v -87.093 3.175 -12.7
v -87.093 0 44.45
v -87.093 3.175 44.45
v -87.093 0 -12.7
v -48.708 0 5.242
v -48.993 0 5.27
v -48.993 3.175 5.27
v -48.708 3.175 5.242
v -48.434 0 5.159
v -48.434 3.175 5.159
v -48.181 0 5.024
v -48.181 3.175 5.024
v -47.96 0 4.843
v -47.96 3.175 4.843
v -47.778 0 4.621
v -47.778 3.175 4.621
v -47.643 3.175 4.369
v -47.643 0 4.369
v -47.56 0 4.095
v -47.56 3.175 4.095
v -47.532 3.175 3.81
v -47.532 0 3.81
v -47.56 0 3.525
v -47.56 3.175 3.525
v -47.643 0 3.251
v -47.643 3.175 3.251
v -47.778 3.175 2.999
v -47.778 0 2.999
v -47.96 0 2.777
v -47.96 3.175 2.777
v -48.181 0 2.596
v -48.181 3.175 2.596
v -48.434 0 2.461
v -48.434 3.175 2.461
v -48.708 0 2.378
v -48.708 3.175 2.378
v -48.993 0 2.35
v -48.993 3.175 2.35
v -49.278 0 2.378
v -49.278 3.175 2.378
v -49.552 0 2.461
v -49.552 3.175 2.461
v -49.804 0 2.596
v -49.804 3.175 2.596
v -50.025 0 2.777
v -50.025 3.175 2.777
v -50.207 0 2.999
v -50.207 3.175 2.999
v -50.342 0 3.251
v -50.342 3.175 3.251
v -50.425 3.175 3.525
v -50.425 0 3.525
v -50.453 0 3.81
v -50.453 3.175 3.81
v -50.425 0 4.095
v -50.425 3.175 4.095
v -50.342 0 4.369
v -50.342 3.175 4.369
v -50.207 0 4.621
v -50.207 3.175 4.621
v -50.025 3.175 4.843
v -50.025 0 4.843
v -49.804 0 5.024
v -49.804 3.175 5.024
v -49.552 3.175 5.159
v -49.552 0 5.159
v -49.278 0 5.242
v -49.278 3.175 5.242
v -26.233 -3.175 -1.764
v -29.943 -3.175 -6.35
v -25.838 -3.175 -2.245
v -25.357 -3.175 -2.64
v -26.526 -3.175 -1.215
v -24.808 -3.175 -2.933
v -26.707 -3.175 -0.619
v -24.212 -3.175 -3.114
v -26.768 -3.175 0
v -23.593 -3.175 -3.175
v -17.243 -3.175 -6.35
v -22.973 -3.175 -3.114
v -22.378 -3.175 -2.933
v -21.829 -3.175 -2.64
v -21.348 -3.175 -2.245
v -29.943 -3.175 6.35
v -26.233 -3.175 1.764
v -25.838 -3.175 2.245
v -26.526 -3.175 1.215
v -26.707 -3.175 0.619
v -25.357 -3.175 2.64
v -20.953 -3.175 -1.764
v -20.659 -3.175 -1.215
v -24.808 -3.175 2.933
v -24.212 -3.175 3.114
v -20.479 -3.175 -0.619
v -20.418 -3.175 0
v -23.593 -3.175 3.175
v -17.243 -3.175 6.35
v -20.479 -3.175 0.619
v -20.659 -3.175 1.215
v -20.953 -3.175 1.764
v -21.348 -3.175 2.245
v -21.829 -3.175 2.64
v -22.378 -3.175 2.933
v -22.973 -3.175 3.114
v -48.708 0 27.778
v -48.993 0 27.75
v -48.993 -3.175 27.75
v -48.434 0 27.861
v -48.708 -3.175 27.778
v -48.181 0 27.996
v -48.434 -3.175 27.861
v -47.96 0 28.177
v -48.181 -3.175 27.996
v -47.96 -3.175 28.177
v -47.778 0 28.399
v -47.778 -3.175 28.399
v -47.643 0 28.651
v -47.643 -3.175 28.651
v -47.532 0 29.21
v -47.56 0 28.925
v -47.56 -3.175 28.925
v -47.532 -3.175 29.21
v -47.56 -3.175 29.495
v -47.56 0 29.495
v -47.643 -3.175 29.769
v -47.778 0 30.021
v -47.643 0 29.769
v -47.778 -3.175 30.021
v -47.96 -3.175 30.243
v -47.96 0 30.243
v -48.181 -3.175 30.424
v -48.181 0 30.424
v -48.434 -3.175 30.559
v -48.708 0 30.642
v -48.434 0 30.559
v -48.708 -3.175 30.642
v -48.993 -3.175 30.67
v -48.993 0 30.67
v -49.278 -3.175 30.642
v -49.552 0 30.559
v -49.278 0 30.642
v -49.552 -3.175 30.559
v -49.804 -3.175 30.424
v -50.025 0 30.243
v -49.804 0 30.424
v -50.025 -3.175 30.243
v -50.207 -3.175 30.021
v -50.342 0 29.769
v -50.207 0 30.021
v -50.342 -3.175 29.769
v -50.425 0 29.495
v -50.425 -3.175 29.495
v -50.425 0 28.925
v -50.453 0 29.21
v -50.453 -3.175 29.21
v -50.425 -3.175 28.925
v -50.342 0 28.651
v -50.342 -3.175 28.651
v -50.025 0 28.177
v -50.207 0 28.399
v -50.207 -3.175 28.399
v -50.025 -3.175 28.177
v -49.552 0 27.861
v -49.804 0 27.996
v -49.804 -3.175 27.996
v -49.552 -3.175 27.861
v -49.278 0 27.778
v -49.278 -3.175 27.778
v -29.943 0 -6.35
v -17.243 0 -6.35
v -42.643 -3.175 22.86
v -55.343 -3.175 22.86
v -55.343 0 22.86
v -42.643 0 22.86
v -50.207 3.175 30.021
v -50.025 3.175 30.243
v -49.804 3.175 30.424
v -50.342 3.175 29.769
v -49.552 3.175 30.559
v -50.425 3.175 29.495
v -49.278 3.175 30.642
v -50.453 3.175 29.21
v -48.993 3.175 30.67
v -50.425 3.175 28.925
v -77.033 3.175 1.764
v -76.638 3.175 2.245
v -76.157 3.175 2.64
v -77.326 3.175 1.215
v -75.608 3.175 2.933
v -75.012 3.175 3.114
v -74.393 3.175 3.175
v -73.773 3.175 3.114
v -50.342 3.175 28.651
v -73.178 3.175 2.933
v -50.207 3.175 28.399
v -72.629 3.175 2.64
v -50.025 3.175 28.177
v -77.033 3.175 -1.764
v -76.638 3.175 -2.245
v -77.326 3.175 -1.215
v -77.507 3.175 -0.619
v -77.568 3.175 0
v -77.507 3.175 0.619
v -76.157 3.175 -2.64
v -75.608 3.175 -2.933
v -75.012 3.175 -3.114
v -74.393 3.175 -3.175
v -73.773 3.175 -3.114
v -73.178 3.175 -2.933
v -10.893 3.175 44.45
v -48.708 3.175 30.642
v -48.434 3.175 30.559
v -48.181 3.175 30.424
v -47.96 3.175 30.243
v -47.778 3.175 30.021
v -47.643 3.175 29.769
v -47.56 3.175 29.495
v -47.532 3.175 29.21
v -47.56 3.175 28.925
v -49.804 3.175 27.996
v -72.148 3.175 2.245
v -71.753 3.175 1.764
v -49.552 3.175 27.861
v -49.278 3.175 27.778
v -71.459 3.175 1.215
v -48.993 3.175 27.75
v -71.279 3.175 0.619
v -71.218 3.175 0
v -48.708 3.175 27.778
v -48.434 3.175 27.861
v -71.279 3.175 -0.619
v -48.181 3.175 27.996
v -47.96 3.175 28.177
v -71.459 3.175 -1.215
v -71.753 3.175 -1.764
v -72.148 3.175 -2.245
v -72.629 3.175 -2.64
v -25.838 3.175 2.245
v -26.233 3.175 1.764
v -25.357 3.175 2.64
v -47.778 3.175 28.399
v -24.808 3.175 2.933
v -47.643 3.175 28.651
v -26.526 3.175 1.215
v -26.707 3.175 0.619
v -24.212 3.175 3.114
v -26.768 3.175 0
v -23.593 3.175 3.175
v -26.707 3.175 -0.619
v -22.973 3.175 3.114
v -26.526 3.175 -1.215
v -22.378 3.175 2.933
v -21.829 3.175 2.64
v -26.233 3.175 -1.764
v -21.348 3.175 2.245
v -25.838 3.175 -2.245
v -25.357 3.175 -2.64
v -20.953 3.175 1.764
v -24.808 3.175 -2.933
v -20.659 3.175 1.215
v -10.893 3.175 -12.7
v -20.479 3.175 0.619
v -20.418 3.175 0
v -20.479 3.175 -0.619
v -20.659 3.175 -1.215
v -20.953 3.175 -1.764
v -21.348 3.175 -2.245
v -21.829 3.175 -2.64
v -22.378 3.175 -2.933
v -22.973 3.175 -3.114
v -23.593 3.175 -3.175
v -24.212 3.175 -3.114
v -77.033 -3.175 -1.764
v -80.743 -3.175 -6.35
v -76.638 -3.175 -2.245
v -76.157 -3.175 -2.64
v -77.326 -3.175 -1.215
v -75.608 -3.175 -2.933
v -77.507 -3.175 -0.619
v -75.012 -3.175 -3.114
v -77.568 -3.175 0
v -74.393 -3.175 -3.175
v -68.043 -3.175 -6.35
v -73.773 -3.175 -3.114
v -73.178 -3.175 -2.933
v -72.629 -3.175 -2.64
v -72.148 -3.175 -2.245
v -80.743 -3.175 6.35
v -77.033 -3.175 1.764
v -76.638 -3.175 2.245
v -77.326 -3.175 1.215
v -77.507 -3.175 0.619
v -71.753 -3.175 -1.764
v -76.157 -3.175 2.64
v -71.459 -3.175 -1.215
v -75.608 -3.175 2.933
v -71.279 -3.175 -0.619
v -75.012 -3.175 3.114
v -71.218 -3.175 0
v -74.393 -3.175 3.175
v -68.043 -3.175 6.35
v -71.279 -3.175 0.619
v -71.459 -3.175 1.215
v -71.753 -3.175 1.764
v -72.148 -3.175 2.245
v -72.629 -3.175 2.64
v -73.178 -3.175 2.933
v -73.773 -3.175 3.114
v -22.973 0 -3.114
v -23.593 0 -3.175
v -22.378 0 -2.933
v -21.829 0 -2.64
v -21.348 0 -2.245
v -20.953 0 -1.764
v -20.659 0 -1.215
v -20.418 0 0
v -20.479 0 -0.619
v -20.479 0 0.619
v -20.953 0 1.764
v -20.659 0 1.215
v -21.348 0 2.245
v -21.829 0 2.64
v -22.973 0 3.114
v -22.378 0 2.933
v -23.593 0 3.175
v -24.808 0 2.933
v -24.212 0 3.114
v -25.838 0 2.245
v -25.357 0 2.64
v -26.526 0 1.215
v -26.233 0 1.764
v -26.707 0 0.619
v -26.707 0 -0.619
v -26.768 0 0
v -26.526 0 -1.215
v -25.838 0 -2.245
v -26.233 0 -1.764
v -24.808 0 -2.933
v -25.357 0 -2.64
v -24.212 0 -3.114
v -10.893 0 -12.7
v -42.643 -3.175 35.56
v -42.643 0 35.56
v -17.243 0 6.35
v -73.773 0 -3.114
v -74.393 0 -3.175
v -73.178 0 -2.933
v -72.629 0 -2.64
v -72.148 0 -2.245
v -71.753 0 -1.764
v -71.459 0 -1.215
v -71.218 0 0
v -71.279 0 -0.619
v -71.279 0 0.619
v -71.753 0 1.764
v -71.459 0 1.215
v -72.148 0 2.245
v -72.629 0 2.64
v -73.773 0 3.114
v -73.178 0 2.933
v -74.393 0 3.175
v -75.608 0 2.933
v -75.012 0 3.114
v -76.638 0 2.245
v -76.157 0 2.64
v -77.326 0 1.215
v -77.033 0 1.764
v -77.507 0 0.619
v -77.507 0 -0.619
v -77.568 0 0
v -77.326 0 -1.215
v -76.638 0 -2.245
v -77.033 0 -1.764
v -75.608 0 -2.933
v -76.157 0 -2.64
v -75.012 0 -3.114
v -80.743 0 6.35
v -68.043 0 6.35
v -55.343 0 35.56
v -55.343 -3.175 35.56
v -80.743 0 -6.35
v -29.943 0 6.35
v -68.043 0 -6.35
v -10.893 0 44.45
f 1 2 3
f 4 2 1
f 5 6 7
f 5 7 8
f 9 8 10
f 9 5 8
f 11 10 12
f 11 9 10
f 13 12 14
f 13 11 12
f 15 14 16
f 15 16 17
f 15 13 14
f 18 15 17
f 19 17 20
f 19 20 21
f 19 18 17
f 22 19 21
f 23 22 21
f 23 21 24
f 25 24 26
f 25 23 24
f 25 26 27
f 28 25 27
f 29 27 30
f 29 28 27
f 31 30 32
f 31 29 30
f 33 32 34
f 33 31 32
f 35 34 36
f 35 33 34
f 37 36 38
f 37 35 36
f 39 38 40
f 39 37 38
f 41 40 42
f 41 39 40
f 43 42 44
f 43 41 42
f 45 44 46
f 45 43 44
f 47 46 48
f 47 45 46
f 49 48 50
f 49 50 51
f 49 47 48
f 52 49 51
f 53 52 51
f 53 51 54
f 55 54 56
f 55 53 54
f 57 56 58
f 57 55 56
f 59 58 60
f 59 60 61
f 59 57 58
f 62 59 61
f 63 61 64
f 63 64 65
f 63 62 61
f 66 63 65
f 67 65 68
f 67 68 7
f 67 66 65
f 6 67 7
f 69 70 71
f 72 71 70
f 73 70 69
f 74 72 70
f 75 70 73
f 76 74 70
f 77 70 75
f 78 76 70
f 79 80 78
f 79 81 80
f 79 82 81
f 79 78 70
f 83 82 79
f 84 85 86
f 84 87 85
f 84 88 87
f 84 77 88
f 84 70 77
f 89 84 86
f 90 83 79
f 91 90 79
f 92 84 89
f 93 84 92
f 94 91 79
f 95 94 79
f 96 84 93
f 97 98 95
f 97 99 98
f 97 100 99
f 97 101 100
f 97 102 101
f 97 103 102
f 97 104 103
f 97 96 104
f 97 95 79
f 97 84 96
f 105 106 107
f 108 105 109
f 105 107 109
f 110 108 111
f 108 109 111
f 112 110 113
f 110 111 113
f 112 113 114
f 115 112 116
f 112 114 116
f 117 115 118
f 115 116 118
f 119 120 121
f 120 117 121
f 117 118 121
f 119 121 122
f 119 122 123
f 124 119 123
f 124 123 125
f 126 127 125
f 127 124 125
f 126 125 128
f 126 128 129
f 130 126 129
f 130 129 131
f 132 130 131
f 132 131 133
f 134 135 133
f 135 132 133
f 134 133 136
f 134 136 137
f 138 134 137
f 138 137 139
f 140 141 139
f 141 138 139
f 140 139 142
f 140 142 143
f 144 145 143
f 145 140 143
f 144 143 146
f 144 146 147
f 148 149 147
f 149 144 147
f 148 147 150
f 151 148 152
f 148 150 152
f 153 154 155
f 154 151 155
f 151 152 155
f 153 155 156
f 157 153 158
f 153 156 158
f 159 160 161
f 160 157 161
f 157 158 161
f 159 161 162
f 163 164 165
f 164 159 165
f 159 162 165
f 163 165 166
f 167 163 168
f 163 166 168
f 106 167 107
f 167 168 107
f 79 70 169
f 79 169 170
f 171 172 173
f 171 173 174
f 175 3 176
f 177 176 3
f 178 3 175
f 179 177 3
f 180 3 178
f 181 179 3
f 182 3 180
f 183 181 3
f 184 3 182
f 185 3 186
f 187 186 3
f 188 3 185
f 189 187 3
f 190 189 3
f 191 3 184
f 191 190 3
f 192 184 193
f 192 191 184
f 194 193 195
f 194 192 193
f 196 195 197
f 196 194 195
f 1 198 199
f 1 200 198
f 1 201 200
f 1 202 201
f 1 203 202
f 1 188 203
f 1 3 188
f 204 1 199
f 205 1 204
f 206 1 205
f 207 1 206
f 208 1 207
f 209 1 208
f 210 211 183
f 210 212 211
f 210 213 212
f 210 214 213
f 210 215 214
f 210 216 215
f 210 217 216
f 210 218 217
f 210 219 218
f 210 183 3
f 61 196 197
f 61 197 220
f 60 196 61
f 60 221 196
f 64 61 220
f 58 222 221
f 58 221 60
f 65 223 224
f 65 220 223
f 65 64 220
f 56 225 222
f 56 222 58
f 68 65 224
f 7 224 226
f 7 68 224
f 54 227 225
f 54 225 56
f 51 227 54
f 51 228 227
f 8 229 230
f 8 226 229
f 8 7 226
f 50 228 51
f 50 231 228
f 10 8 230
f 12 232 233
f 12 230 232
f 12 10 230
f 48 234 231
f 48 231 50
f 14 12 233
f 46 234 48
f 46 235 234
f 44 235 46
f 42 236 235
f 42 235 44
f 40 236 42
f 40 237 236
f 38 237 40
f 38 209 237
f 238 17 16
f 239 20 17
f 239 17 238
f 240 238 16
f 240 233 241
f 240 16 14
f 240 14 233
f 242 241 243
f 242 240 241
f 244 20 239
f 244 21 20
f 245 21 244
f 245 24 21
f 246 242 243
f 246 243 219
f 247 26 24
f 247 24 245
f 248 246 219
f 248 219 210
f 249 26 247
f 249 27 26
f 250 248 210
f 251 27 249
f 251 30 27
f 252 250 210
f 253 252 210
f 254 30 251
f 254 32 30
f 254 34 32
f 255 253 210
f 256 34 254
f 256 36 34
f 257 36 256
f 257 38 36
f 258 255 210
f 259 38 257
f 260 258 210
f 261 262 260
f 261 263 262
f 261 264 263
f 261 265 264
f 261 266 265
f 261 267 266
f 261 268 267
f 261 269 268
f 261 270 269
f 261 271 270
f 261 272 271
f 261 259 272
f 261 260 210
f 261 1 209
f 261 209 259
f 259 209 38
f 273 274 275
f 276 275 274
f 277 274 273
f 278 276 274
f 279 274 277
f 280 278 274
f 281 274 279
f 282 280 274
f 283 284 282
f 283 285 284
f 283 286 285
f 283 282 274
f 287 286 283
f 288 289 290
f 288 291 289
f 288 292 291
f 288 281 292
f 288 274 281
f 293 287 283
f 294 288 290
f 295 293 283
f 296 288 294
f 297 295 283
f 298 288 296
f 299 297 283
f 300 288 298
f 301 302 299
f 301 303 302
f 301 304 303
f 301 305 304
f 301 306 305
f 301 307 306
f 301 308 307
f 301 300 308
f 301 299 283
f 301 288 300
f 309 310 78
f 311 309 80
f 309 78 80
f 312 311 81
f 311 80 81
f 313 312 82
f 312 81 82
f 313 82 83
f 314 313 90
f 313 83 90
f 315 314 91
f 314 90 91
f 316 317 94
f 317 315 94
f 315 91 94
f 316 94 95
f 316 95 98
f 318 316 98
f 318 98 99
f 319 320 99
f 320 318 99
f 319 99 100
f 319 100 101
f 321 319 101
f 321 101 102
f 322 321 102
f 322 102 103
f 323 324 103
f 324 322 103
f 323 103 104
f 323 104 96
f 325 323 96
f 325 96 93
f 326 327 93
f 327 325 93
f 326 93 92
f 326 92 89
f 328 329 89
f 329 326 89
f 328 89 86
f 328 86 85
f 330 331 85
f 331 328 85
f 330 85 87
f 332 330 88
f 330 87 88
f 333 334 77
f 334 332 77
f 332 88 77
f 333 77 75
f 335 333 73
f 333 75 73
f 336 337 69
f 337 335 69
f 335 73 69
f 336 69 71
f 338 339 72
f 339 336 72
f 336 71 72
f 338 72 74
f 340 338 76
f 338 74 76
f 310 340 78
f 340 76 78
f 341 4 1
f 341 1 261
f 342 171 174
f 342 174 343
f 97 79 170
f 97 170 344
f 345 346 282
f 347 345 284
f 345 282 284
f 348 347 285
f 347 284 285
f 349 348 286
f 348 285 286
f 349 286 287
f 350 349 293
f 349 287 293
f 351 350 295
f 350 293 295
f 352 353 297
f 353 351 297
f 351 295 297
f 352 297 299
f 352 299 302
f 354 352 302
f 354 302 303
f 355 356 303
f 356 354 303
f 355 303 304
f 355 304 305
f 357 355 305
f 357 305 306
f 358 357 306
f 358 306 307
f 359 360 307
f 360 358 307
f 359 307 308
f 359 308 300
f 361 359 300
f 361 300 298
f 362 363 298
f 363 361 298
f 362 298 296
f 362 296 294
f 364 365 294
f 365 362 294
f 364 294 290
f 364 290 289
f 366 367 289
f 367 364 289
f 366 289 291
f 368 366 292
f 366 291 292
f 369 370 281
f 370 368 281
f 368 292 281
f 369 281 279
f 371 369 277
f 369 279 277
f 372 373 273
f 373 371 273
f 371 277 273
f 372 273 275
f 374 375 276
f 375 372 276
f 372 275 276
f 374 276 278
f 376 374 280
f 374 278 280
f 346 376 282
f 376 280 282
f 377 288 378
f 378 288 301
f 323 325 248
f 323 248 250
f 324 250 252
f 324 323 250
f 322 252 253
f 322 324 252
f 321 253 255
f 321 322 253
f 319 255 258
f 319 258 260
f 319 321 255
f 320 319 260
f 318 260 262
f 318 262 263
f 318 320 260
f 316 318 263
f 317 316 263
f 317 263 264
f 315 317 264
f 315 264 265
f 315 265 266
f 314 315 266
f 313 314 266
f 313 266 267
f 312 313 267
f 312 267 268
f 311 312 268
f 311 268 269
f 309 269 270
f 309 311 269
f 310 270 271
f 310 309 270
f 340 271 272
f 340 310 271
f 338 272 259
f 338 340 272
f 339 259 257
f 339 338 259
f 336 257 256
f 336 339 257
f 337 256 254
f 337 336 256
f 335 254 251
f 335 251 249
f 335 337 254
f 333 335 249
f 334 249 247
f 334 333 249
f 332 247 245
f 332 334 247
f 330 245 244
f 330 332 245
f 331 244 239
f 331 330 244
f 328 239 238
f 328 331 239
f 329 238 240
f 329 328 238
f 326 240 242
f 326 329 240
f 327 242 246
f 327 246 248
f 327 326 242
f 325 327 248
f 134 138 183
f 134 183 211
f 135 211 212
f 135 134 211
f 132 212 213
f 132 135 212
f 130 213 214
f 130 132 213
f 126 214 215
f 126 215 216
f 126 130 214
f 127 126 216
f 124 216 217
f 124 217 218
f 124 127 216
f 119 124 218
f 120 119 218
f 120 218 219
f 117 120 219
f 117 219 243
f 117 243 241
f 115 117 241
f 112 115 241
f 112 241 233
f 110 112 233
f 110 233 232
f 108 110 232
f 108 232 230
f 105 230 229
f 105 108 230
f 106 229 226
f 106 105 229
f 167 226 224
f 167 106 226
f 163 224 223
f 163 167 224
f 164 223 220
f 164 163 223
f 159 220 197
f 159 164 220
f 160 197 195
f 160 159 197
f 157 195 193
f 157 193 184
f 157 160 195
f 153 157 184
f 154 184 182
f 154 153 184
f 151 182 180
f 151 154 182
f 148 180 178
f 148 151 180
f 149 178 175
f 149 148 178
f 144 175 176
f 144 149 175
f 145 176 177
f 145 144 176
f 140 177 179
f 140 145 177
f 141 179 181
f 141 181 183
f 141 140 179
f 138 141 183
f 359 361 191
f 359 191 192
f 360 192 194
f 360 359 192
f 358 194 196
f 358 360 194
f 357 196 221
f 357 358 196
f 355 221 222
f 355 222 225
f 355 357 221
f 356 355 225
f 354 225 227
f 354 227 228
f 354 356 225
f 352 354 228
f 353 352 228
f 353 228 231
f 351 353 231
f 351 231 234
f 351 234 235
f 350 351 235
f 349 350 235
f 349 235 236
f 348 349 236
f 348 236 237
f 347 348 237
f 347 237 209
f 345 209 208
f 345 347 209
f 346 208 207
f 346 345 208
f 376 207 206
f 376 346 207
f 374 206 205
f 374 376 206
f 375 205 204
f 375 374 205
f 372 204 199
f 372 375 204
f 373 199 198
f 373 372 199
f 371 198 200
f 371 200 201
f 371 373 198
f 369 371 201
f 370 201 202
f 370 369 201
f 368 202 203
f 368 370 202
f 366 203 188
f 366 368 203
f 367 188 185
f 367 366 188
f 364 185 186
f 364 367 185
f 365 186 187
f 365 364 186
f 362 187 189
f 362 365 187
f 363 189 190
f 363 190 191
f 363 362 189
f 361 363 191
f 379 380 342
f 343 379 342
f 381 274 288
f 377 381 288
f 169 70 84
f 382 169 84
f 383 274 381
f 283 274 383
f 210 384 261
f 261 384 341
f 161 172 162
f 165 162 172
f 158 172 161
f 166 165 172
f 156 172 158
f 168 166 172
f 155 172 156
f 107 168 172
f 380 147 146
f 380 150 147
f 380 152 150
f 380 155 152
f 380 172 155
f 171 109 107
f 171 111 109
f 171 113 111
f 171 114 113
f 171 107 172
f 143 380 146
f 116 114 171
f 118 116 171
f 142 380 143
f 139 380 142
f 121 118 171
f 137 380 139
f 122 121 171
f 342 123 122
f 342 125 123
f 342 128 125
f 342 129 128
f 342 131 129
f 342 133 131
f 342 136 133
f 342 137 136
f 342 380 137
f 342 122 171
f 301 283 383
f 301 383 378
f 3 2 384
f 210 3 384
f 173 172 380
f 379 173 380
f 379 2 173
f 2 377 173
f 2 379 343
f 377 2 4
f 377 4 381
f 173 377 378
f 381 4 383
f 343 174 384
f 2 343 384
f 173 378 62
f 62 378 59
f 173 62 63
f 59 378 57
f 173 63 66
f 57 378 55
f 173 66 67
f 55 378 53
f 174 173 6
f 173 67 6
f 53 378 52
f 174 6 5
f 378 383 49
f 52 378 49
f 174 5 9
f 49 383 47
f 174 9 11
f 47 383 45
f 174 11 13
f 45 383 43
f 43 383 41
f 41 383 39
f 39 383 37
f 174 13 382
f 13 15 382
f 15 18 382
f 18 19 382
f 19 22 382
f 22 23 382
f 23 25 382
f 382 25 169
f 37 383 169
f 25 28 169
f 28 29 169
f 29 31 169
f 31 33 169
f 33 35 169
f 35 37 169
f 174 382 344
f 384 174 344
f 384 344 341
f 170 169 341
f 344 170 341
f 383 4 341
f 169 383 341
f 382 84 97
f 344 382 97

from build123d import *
from build123d.topology import SkipClean

# Parameters (mm, degrees)
SKETCH2_W           = 76.2
SKETCH2_H           = 57.15
SKETCH2_R           = 3.175
SKETCH2_R_2         = 1.4605
BOSS_EXTRUDE2_DEPTH = 3.175
BOSS_EXTRUDE6_START = 3.175
SKETCH7_W           = 12.7
SKETCH7_H           = 12.7
SKETCH7_R           = 3.175
SKETCH7_R_2         = 1.4605
BOSS_EXTRUDE6_DEPTH = 3.175


with BuildPart() as part:
    # Sketch2 → Boss-Extrude2 (new body)
    with BuildSketch(Plane(origin=(-10.658170765, 0, 0), x_dir=(1, 0, 0), z_dir=(0, 1, 0))):
        with Locations((-38.334546053, -15.875)):
            Rectangle(SKETCH2_W, SKETCH2_H)
        with Locations(Location((-63.734546053, 0, 0), (0, 0, 270))):
            Circle(SKETCH2_R, mode=Mode.SUBTRACT)
        with Locations(Location((-12.934546053, 0, 0), (0, 0, 270))):
            Circle(SKETCH2_R, mode=Mode.SUBTRACT)
        with Locations(Location((-38.334546053, -29.21, 0), (0, 0, 270))):
            Circle(SKETCH2_R_2, mode=Mode.SUBTRACT)
        with Locations(Location((-38.334546053, -3.81, 0), (0, 0, 270))):
            Circle(SKETCH2_R_2, mode=Mode.SUBTRACT)
    extrude(amount=BOSS_EXTRUDE2_DEPTH)

    # Sketch7 → Boss-Extrude6 (add)
    # profile 1 of 3: a face of its own
    with SkipClean():  # the faces are left unmerged after this step: merging them gives an invalid solid
        with BuildSketch(Plane.XZ.offset(BOSS_EXTRUDE6_START)):
            with Locations((-74.392716818, 0)):
                Rectangle(SKETCH7_W, SKETCH7_H)
            with Locations(Location((-74.392716818, 0, 0), (0, 0, 270))):
                Circle(SKETCH7_R, mode=Mode.SUBTRACT)
        # profile 2 of 3: a face of its own
        with BuildSketch(Plane.XZ.offset(BOSS_EXTRUDE6_START)):
            with Locations((-23.592716818, 0)):
                Rectangle(SKETCH7_W, SKETCH7_H)
            with Locations(Location((-23.592716818, 0, 0), (0, 0, 270))):
                Circle(SKETCH7_R, mode=Mode.SUBTRACT)
        # profile 3 of 3: a face of its own
        with BuildSketch(Plane.XZ.offset(BOSS_EXTRUDE6_START)):
            with Locations((-48.992716818, 29.21)):
                Rectangle(SKETCH7_W, SKETCH7_H)
            with Locations(Location((-48.992716818, 29.21, 0), (0, 0, 270))):
                Circle(SKETCH7_R_2, mode=Mode.SUBTRACT)
        extrude(amount=-BOSS_EXTRUDE6_DEPTH)


solid = part.part
